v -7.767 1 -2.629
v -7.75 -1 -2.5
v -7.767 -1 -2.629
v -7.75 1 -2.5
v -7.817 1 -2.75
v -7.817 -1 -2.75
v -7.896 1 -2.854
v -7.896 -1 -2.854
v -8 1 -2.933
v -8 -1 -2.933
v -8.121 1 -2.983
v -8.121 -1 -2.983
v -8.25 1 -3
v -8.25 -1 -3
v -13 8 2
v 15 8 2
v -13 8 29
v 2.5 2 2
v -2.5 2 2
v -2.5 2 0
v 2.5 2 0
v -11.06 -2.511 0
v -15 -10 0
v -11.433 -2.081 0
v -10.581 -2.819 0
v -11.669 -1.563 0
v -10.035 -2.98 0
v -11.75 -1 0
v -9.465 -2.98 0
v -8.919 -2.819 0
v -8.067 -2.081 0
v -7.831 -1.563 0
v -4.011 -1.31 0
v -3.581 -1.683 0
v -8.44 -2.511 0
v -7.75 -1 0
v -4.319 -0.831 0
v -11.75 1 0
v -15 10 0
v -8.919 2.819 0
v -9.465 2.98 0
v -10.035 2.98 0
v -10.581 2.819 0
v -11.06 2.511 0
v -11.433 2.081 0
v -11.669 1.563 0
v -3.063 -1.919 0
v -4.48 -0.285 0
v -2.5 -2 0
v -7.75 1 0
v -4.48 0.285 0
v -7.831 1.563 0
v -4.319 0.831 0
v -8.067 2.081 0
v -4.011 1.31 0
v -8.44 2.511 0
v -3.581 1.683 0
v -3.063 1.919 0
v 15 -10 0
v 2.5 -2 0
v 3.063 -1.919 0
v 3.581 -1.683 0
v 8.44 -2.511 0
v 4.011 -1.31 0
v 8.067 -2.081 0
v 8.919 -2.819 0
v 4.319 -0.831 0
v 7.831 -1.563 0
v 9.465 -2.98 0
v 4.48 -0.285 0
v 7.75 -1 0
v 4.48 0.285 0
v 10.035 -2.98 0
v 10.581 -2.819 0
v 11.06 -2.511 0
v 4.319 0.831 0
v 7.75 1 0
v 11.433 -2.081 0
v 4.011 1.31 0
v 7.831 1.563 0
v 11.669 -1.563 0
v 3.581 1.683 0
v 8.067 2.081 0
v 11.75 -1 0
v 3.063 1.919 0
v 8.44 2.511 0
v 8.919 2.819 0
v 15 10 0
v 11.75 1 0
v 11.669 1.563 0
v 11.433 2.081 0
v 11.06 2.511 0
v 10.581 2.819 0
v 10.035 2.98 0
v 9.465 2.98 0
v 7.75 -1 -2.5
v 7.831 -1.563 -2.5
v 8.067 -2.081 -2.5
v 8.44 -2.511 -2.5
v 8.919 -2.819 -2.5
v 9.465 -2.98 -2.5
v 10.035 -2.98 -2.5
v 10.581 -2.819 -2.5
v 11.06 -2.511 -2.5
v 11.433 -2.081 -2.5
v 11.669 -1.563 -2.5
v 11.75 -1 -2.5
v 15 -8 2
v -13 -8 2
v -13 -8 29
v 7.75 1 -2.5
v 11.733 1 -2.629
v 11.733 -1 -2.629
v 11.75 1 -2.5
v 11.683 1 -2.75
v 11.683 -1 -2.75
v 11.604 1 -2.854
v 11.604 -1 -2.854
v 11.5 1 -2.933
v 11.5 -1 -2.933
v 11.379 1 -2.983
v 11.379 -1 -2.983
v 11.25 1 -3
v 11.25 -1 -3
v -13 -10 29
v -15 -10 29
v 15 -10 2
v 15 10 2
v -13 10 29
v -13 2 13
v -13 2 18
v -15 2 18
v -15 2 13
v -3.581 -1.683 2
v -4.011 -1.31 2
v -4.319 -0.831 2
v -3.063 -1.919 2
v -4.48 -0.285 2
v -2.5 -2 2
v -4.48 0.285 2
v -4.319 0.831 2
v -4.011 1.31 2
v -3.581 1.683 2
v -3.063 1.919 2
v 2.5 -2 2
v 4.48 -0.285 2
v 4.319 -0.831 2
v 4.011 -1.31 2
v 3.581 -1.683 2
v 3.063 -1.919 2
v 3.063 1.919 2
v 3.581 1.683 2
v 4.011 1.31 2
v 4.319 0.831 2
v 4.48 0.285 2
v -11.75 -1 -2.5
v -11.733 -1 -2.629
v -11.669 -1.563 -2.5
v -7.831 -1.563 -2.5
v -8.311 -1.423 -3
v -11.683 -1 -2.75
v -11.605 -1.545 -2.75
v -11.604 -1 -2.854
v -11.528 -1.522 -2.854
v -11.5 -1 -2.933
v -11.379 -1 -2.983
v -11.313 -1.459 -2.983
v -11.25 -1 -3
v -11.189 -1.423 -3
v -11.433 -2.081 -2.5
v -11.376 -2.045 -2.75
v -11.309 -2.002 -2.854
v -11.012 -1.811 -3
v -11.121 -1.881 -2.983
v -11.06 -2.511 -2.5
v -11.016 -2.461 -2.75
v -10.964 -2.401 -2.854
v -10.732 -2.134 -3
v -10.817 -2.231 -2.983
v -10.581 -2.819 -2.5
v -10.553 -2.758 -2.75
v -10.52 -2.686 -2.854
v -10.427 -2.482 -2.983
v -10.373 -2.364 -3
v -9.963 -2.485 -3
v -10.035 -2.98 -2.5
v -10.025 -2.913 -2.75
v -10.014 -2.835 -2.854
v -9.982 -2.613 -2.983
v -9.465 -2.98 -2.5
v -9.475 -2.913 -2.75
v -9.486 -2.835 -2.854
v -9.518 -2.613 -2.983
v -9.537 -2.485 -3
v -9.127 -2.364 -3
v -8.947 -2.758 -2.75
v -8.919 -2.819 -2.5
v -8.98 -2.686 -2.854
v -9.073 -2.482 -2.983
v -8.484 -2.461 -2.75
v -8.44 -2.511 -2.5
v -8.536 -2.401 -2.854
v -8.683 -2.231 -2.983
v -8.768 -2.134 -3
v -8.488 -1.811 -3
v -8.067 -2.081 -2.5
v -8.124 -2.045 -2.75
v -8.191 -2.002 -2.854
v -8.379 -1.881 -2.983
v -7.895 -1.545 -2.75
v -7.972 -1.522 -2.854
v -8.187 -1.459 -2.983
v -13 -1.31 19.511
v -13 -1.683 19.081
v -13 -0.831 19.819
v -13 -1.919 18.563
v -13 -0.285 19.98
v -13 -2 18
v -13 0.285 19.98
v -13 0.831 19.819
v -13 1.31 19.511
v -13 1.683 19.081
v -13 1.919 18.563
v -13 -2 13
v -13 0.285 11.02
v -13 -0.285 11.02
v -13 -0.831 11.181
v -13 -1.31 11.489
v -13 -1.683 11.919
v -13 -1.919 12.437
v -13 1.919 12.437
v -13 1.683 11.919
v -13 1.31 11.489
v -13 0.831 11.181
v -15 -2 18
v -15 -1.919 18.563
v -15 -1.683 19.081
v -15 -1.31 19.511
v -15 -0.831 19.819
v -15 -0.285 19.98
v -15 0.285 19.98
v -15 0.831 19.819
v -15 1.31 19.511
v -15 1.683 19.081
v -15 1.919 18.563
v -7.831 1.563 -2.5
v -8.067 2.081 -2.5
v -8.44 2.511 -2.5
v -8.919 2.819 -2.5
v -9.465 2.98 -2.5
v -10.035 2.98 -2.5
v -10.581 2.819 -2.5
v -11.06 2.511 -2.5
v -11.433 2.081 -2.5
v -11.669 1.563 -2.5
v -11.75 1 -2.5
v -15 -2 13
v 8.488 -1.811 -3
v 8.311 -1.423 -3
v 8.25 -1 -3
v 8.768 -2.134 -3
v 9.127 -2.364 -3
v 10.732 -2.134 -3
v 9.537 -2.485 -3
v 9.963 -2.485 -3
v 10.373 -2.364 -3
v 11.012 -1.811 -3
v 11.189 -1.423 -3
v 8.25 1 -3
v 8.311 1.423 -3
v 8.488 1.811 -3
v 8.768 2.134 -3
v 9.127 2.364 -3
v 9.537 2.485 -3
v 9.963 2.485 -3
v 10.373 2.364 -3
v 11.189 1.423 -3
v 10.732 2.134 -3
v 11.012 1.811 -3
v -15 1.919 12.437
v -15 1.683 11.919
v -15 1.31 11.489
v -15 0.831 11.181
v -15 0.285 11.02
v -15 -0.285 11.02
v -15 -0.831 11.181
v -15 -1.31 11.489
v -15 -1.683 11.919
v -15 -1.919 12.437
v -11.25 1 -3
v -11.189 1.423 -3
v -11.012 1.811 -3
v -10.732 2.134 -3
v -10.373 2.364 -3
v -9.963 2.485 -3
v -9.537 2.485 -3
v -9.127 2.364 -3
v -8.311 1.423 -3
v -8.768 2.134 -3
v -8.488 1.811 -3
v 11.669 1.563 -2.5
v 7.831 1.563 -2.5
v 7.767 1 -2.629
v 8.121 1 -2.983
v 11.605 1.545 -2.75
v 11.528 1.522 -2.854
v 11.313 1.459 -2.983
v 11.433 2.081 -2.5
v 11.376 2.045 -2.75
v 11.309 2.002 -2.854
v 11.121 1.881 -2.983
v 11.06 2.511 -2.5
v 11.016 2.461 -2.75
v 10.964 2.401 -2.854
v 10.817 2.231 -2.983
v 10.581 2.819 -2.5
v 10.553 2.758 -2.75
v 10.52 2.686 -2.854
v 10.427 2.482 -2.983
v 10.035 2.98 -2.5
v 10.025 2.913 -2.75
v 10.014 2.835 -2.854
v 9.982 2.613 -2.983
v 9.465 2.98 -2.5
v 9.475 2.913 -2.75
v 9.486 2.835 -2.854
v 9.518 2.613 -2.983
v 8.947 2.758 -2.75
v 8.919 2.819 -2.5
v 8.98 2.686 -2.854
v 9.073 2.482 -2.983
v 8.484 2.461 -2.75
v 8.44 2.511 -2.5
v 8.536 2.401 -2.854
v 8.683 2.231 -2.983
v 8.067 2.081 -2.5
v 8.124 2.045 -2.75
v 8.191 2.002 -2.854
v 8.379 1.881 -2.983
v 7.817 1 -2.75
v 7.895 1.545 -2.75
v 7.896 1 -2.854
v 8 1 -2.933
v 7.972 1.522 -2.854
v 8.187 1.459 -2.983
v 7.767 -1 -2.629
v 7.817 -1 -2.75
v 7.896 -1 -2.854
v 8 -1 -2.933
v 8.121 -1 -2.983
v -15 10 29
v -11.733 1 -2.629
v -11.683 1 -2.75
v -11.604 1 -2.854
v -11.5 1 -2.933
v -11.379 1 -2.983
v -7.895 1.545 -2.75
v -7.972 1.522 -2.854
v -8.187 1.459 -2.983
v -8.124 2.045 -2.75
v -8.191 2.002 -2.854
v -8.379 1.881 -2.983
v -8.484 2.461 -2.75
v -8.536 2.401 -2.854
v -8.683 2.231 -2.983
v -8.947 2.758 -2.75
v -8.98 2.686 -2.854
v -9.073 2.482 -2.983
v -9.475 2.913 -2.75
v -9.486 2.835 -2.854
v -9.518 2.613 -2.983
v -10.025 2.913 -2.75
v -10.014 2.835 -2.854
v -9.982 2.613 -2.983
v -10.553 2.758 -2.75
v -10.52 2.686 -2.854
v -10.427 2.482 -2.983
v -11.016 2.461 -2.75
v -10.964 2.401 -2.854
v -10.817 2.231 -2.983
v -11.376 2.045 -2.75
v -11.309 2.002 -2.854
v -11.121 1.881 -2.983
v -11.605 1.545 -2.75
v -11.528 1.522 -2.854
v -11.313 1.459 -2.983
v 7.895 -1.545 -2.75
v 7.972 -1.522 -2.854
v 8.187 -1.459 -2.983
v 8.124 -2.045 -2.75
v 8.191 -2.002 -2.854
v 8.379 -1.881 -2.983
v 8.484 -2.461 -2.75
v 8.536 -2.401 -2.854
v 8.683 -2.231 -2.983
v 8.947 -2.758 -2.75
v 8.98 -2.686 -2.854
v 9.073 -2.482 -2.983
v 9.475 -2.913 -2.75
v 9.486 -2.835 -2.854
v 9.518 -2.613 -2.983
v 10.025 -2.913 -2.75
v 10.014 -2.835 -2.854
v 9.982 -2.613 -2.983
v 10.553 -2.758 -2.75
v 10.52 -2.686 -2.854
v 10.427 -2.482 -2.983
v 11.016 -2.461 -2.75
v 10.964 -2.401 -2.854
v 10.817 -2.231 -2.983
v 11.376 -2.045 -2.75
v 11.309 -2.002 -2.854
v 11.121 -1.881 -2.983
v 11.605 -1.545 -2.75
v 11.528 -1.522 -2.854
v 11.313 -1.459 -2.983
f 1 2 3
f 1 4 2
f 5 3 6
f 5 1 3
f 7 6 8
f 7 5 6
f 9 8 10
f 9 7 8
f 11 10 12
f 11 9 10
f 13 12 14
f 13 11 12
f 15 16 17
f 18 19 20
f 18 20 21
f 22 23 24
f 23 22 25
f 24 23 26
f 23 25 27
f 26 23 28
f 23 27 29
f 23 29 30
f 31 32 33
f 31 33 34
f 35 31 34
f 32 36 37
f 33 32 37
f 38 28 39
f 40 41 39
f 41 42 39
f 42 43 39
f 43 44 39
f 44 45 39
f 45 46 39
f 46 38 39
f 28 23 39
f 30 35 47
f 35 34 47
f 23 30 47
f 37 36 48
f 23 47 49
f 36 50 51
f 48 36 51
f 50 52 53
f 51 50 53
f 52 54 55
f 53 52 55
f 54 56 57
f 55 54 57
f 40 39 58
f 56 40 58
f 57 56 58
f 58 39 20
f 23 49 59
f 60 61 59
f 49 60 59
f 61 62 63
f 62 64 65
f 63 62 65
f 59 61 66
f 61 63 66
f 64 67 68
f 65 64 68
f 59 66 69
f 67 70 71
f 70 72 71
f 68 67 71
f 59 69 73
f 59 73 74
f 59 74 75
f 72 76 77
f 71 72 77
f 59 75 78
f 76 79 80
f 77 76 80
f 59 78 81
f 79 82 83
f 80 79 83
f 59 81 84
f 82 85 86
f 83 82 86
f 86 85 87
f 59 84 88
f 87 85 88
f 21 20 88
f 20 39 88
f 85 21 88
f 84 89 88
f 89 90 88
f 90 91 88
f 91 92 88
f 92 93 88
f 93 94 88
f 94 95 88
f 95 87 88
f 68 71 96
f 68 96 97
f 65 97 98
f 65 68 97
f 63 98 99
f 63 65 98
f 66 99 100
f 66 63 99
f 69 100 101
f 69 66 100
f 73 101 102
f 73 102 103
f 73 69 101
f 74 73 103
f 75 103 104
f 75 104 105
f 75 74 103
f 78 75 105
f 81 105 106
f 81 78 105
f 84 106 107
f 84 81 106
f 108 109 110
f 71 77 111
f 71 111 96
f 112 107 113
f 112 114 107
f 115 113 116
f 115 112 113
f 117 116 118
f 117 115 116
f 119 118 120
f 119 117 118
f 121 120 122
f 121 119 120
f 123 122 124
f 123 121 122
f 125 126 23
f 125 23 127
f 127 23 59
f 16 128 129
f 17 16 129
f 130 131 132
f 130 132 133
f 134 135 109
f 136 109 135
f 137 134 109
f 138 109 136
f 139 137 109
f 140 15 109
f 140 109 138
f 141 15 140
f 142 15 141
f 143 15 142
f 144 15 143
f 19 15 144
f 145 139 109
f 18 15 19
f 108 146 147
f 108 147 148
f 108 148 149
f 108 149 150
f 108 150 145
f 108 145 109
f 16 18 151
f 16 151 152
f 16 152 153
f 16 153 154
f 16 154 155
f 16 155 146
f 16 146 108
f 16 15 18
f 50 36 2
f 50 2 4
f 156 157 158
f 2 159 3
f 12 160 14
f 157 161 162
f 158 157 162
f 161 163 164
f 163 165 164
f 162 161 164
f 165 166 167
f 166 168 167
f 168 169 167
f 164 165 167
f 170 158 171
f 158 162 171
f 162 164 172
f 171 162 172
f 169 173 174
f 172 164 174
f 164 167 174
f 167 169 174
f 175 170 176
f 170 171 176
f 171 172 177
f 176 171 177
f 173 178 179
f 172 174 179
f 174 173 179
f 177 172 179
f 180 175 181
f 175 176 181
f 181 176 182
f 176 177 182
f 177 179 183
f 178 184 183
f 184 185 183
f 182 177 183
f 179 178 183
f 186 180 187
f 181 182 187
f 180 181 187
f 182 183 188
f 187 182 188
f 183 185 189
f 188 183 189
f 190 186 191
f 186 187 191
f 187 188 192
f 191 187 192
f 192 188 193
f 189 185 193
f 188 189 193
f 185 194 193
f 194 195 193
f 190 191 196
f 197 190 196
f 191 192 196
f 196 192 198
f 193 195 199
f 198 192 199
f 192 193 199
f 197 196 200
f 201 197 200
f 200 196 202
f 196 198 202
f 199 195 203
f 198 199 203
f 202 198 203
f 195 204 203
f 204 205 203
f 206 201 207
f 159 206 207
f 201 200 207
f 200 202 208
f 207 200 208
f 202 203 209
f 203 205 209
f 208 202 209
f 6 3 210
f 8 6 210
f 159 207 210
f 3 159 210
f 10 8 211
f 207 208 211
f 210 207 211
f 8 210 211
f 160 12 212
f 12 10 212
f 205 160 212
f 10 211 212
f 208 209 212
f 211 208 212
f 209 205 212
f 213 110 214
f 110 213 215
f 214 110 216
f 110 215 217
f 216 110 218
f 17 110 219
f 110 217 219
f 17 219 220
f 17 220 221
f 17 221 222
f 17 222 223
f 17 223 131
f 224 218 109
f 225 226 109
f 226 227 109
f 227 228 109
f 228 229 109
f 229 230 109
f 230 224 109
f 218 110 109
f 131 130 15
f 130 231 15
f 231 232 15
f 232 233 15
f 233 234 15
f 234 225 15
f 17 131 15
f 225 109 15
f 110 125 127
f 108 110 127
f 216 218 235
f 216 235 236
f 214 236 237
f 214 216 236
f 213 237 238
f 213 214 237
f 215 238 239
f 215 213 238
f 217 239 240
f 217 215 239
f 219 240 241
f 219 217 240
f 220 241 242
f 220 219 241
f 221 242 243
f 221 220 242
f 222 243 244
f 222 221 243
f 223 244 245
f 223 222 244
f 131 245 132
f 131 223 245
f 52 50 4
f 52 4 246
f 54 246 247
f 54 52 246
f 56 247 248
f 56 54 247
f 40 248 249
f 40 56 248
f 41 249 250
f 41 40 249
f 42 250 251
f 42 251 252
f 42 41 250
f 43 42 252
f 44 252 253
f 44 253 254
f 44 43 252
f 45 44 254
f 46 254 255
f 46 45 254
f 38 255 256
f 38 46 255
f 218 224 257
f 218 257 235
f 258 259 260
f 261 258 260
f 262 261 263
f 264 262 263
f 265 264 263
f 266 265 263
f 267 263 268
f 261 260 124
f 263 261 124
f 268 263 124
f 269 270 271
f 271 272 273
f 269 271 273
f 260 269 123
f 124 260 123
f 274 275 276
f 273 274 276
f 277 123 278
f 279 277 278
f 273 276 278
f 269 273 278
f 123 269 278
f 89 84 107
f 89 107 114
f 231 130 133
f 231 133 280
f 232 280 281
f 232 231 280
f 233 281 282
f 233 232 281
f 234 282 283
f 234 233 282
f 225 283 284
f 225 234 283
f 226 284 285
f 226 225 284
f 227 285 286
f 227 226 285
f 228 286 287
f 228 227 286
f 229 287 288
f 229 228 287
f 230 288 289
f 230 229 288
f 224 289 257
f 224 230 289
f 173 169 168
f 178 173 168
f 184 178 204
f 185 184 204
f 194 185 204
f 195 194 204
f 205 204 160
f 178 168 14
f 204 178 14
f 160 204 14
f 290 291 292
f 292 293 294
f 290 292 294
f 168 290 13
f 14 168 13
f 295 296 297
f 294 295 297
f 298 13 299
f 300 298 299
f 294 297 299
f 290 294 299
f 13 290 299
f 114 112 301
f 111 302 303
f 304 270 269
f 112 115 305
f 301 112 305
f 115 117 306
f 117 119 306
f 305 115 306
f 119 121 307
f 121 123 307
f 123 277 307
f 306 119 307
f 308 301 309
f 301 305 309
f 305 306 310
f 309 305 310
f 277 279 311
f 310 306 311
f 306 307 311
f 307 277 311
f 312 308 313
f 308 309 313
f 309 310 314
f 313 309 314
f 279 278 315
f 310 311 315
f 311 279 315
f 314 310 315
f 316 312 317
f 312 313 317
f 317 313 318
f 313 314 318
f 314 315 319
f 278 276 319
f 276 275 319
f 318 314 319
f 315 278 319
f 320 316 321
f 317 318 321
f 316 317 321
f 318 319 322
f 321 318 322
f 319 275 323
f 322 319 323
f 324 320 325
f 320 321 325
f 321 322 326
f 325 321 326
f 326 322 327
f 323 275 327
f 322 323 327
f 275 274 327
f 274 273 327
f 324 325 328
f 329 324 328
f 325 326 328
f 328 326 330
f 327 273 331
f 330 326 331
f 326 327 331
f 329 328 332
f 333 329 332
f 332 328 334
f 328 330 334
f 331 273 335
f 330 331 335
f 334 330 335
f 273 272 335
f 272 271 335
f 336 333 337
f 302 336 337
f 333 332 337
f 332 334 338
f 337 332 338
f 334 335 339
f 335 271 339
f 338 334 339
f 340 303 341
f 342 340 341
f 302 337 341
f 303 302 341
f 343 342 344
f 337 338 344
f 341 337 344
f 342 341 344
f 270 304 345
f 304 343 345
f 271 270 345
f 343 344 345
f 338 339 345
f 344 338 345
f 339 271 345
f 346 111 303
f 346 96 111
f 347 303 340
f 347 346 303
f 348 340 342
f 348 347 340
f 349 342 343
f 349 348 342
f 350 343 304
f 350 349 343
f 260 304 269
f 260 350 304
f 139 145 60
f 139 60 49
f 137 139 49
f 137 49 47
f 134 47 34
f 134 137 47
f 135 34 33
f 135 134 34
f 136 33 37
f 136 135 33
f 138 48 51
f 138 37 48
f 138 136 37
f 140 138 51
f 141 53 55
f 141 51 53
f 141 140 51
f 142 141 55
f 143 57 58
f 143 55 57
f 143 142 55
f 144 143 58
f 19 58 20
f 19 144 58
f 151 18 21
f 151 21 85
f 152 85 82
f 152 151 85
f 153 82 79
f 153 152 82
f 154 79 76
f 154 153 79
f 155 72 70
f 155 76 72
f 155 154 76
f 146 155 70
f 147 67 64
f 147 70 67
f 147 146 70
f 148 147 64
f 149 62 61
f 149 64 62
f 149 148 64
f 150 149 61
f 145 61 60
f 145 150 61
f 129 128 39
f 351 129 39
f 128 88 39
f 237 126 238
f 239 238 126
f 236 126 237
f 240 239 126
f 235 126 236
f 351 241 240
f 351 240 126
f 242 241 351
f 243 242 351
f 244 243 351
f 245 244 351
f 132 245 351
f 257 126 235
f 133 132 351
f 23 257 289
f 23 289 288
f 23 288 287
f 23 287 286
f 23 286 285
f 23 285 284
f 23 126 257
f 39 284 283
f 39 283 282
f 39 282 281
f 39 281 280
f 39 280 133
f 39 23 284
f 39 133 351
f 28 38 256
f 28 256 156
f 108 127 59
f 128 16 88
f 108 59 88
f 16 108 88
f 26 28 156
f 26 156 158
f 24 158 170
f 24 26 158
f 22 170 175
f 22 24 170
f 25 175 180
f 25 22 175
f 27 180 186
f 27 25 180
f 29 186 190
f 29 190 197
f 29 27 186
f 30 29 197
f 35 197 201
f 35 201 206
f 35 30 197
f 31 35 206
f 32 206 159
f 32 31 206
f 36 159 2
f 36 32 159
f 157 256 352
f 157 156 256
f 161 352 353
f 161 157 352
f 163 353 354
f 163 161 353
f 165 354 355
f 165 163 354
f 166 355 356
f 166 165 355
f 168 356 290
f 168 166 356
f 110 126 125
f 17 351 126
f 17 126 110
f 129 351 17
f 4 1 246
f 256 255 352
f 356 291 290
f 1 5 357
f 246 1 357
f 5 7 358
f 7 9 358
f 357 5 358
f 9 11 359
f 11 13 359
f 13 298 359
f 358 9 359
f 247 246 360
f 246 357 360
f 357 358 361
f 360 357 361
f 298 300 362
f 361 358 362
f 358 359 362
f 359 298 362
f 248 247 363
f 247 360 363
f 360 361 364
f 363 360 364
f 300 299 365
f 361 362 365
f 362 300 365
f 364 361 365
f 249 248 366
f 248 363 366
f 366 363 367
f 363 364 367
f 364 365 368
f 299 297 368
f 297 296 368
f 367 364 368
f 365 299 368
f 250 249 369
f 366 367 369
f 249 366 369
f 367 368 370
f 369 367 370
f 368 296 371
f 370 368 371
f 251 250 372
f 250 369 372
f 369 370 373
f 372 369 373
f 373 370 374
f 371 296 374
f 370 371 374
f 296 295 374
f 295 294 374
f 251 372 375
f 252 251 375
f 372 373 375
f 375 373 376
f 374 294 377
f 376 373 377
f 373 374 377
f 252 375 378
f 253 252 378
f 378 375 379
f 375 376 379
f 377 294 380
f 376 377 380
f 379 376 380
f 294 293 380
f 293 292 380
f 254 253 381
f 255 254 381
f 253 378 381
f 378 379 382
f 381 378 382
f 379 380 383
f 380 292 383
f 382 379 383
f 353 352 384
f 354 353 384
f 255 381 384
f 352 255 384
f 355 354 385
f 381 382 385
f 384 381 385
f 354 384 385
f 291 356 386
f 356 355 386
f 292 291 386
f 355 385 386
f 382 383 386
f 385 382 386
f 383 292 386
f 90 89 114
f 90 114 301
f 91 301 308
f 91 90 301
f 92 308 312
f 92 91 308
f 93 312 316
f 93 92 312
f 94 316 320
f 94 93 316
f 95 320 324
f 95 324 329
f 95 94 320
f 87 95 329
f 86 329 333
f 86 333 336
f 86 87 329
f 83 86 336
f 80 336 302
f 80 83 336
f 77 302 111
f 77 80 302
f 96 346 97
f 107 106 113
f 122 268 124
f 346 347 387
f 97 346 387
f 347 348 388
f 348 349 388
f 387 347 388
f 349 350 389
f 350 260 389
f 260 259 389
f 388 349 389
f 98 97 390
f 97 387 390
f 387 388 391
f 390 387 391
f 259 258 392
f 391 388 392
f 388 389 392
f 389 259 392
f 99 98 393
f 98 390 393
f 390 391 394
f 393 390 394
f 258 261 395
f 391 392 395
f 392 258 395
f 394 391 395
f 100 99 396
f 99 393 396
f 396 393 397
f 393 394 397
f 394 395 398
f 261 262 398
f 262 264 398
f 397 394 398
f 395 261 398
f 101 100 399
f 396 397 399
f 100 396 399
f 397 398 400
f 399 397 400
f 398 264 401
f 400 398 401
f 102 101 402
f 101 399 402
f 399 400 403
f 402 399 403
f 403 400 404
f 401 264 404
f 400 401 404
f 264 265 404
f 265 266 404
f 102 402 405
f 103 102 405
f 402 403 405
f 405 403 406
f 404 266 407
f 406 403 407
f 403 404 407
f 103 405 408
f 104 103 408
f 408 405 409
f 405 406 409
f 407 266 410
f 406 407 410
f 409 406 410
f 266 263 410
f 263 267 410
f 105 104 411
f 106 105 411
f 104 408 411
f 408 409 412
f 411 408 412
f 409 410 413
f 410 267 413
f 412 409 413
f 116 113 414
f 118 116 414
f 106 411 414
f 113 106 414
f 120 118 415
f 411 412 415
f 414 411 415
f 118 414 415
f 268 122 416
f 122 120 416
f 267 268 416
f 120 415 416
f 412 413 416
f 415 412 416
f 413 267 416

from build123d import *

# Parameters (mm, degrees)
ESQUISSE1_W             = 30
ESQUISSE1_H             = 20
BOSS_EXTRU_1_DEPTH      = 2
ESQUISSE2_W             = 2
ESQUISSE2_H             = 20
BOSS_EXTRU_2_DEPTH      = 27
ENL_V_MAT_EXTRU_1_DEPTH = 27
ENL_V_MAT_EXTRU_2_DEPTH = 27
BOSS_EXTRU_3_DEPTH      = 2
BOSS_EXTRU_4_DEPTH      = 2
BOSS_EXTRU_5_DEPTH      = 3
CONG_2_R                = 0.5
CONG_3_R                = 0.5


with BuildPart() as part:
    # Esquisse1 → Boss.-Extru.1 (new body)
    with BuildSketch(Plane.XY):
        Rectangle(ESQUISSE1_W, ESQUISSE1_H)
    extrude(amount=BOSS_EXTRU_1_DEPTH)

    # Esquisse2 → Boss.-Extru.2 (add)
    with BuildSketch(Plane.XY.offset(2)):
        with Locations((-14, 0)):
            Rectangle(ESQUISSE2_W, ESQUISSE2_H)
    extrude(amount=BOSS_EXTRU_2_DEPTH)

    # Esquisse3 → Enlèv. mat.-Extru.1 (cut)
    with BuildSketch(Plane.XY.offset(2)):
        with BuildLine():
            Line((-2.5, 2), (2.5, 2))
            ThreePointArc((2.5, 2), (4.5, 0), (2.5, -2))
            Line((2.5, -2), (-2.5, -2))
            ThreePointArc((-2.5, -2), (-4.5, 0), (-2.5, 2))
        make_face()
    extrude(amount=-ENL_V_MAT_EXTRU_1_DEPTH, mode=Mode.SUBTRACT)

    # Esquisse4 → Enlèv. mat.-Extru.2 (cut)
    with BuildSketch(Plane(origin=(-13, 0, 0), x_dir=(0, 0, -1), z_dir=(1, 0, 0))):
        with BuildLine():
            Line((-18, 2), (-13, 2))
            ThreePointArc((-13, 2), (-11, 0), (-13, -2))
            Line((-13, -2), (-18, -2))
            ThreePointArc((-18, -2), (-20, 0), (-18, 2))
        make_face()
    extrude(amount=-ENL_V_MAT_EXTRU_2_DEPTH, mode=Mode.SUBTRACT)

    # Esquisse5 → Boss.-Extru.3 (add)
    with BuildSketch(Plane(origin=(0, -10, 0), x_dir=(-1, 0, 0), z_dir=(0, -1, 0))):
        Polygon((13, -29), (-15, -2), (13, -2), align=None)
    extrude(amount=-BOSS_EXTRU_3_DEPTH)

    # Esquisse6 → Boss.-Extru.4 (add)
    with BuildSketch(Plane(origin=(0, 10, 0), x_dir=(1, 0, 0), z_dir=(0, 1, 0))):
        Polygon((15, -2), (-13, -29), (-13, -2), align=None)
    extrude(amount=-BOSS_EXTRU_4_DEPTH)

    # Esquisse7 → Boss.-Extru.5 (add)
    with BuildSketch(Plane(origin=(0, 0, 0), x_dir=(-1, 0, 0), z_dir=(0, 0, -1))):
        with BuildLine():
            Line((-11.75, -1), (-11.75, 1))
            ThreePointArc((-11.75, 1), (-9.75, 3), (-7.75, 1))
            Line((-7.75, 1), (-7.75, -1))
            ThreePointArc((-7.75, -1), (-9.75, -3), (-11.75, -1))
        make_face()
        with BuildLine():
            Line((7.75, -1), (7.75, 1))
            ThreePointArc((7.75, 1), (9.75, 3), (11.75, 1))
            Line((11.75, 1), (11.75, -1))
            ThreePointArc((11.75, -1), (9.75, -3), (7.75, -1))
        make_face()
    extrude(amount=BOSS_EXTRU_5_DEPTH)

    # Congé2
    cong_2_edges = [part.edges().sort_by_distance(p)[0] for p in [
        (9.75, -3, -3),
        (7.75, 0, -3),
        (9.75, 3, -3),
        (11.75, 0, -3),
    ]]
    fillet(cong_2_edges, radius=CONG_2_R)

    # Congé3
    cong_3_edges = [part.edges().sort_by_distance(p)[0] for p in [
        (-9.75, -3, -3),
        (-11.75, 0, -3),
        (-9.75, 3, -3),
        (-7.75, 0, -3),
    ]]
    fillet(cong_3_edges, radius=CONG_3_R)


solid = part.part
